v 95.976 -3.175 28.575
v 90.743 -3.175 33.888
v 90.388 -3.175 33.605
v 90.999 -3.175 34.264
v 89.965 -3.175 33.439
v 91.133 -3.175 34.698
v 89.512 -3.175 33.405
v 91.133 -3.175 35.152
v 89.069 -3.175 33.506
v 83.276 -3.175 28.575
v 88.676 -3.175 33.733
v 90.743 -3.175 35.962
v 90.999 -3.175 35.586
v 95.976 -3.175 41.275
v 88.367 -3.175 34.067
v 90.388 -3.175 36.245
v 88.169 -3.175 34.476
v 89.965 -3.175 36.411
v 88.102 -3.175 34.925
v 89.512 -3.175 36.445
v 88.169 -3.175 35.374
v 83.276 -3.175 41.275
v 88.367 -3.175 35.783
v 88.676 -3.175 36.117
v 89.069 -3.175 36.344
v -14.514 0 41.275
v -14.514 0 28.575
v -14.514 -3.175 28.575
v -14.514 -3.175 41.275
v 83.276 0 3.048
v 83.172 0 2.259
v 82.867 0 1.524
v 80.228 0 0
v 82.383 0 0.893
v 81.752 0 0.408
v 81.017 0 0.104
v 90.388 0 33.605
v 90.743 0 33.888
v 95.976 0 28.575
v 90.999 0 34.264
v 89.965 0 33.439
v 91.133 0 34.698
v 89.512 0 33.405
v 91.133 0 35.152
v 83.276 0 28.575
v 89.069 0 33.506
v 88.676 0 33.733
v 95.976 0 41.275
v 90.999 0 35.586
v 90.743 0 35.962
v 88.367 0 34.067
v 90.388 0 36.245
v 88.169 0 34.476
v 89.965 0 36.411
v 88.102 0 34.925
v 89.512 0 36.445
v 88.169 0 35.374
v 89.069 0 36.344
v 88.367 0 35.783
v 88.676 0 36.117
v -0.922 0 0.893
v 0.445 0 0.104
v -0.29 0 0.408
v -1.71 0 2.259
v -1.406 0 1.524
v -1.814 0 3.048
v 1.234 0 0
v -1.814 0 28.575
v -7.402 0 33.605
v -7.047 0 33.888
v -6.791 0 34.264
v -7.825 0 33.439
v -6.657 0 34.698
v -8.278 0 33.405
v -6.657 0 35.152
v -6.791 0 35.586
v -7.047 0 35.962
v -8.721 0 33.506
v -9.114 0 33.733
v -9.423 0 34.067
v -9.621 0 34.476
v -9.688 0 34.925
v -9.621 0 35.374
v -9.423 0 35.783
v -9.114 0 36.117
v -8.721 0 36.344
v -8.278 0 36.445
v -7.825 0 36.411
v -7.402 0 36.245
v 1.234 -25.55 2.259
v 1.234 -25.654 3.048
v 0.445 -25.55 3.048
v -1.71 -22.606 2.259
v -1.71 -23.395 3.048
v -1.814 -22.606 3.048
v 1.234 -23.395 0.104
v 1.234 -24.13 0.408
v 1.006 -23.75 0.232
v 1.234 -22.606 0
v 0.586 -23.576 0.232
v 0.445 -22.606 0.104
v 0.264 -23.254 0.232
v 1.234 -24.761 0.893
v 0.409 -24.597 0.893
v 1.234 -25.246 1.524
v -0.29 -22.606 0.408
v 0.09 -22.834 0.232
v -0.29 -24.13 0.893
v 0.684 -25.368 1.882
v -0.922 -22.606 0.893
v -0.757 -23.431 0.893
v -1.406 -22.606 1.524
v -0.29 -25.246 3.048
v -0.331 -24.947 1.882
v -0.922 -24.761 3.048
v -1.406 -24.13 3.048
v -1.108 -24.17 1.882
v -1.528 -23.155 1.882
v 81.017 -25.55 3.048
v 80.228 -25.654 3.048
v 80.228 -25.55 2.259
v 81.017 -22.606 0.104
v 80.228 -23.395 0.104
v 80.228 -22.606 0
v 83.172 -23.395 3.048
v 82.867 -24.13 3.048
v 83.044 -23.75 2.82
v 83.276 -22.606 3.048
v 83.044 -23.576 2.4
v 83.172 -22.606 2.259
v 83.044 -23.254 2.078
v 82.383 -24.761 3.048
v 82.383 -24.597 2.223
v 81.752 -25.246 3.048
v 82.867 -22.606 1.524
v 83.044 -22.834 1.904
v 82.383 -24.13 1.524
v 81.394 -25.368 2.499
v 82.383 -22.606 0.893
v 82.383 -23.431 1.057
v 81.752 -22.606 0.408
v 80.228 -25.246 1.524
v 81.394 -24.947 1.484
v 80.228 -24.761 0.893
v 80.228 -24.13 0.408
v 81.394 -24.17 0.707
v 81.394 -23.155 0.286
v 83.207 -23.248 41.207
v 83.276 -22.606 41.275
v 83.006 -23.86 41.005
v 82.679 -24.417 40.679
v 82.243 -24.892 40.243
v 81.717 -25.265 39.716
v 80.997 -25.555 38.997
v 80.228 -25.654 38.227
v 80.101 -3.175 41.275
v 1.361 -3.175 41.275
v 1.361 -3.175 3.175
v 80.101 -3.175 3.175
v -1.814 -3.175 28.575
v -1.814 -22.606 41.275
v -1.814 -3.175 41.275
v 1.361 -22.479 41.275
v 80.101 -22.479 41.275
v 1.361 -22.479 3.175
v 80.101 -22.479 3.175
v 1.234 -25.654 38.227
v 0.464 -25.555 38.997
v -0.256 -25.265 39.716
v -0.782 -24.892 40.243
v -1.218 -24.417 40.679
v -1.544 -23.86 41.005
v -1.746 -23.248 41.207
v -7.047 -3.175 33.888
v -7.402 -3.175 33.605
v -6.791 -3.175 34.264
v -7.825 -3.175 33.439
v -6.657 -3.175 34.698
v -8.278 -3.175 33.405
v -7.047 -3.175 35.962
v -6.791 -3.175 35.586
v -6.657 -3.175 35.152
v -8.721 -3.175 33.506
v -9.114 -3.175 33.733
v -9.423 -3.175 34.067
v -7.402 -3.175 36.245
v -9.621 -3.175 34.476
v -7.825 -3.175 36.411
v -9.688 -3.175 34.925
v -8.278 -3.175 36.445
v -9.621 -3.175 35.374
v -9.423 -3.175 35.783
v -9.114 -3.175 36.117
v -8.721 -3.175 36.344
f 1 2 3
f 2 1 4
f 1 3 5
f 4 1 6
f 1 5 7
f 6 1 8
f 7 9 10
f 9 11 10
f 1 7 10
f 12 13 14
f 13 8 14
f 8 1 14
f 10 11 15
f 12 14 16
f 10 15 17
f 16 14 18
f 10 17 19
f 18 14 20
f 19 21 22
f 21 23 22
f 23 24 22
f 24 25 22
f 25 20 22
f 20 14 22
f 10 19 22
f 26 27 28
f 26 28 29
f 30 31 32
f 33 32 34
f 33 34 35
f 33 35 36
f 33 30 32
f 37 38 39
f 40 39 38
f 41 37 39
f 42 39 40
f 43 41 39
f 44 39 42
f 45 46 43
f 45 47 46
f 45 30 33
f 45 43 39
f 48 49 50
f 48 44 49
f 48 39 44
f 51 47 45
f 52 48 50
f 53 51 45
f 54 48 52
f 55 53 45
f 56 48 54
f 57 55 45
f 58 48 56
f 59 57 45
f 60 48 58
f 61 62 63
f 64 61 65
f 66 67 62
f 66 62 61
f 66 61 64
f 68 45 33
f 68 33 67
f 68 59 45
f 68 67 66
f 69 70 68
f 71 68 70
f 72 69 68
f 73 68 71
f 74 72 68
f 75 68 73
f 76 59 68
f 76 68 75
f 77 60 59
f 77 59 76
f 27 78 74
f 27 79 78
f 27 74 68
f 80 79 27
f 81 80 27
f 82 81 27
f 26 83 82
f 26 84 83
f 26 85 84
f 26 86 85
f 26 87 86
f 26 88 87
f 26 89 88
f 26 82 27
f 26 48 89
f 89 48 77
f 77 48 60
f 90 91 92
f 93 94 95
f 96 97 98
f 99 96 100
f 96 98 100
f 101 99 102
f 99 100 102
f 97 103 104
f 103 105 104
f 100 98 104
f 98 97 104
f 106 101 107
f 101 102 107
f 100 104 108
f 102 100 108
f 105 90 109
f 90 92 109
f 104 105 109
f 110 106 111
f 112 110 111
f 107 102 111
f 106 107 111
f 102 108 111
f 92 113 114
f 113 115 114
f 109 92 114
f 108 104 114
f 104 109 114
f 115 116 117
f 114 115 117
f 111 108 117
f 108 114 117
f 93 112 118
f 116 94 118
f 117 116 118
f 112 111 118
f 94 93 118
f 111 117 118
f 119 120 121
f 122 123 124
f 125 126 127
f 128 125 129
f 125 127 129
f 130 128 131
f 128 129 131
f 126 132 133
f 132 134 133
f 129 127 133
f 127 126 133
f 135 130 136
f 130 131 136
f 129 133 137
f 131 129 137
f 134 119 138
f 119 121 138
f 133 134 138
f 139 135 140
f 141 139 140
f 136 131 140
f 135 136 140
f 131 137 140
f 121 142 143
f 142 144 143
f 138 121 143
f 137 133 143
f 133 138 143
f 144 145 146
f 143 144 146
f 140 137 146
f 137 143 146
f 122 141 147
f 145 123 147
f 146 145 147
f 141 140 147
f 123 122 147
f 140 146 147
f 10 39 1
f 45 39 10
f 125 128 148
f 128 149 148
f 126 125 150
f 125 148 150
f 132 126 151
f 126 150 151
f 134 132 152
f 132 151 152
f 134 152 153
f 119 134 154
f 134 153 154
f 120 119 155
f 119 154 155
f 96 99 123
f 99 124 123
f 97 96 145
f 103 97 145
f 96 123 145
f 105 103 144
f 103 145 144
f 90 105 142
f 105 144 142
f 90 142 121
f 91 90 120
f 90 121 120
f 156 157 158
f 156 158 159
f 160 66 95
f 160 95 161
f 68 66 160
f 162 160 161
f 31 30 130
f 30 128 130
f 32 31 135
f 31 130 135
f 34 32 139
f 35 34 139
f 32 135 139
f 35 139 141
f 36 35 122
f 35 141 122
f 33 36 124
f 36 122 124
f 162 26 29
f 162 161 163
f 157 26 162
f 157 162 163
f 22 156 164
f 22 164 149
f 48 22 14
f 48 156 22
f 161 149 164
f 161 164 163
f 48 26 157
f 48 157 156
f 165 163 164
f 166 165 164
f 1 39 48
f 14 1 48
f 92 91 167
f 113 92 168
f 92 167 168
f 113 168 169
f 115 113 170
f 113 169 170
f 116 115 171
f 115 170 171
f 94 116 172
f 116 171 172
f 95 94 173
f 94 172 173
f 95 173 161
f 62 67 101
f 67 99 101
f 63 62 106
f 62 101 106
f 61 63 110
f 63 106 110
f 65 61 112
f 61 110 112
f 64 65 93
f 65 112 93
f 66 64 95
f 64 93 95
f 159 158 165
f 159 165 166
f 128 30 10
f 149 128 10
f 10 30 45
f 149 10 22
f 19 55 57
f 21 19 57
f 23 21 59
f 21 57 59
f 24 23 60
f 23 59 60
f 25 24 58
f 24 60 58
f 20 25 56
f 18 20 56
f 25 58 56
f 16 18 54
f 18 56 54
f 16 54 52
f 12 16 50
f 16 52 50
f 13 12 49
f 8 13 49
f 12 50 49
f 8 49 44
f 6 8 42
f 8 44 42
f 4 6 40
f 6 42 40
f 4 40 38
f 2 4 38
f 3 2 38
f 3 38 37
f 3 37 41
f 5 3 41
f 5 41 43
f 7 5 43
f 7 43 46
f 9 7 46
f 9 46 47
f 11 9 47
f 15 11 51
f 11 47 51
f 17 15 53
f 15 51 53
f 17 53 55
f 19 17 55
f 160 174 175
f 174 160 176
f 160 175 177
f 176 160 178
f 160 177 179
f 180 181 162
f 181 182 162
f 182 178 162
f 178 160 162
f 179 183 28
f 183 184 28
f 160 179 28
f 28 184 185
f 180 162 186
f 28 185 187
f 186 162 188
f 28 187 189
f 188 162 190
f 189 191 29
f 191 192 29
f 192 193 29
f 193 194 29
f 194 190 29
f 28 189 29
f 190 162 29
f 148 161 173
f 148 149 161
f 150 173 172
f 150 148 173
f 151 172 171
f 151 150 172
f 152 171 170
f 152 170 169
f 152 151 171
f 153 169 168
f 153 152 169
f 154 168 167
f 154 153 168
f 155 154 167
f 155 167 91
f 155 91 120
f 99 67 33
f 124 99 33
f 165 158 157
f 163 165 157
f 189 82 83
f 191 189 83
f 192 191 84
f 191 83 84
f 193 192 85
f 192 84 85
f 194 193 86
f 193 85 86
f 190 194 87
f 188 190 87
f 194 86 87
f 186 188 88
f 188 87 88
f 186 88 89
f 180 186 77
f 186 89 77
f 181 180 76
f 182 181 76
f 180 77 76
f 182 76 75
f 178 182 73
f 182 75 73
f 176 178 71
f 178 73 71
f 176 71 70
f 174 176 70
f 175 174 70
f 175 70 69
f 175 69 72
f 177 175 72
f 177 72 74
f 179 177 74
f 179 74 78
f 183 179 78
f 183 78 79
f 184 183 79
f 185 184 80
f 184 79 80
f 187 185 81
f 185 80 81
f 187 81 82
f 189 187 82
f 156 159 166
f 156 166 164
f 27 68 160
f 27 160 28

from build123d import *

# Parameters (mm, degrees)
F0_W     = 85.09
F0_H     = 41.275
F1_DEPTH = 25.654
F2_T     = -3.175
F3_W     = 12.7
F3_H     = 12.7
F3_R     = 1.524
F4_DEPTH = 3.175
F5_R     = 3.048


with BuildPart() as f1:
    # F0 (on Front) → F1 (new body)
    with BuildSketch(Plane.XZ):
        with Locations((40.730714, 20.6375)):
            Rectangle(F0_W, F0_H)
    extrude(amount=F1_DEPTH)

    # F2
    f2_openings = [f1.faces().sort_by_distance(p)[0] for p in [
        (40.730714, -12.827, 41.275),
    ]]
    offset(amount=F2_T, openings=f2_openings)

    # F3 (on face) → F4 (join)
    with BuildSketch(Plane(origin=(0, 0, 0), x_dir=(-1, 0, 0), z_dir=(0, 1, 0))):
        with Locations((8.164286, 34.925)):
            Rectangle(F3_W, F3_H)
        with Locations((8.164286, 34.925)):
            Circle(F3_R, mode=Mode.SUBTRACT)
        with Locations((-89.625714, 34.925)):
            Rectangle(F3_W, F3_H)
        with Locations((-89.625714, 34.925)):
            Circle(F3_R, mode=Mode.SUBTRACT)
    extrude(amount=-F4_DEPTH)

    # F5
    f5_edges = [f1.edges().sort_by_distance(p)[0] for p in [
        (40.730714, -25.654, 41.275),
        (-1.814286, -25.654, 20.6375),
        (40.730714, -25.654, 0),
        (83.275714, -25.654, 20.6375),
        (83.275714, -12.827, 0),
        (-1.814286, -12.827, 0),
    ]]
    fillet(f5_edges, radius=F5_R)


solid = f1.part
